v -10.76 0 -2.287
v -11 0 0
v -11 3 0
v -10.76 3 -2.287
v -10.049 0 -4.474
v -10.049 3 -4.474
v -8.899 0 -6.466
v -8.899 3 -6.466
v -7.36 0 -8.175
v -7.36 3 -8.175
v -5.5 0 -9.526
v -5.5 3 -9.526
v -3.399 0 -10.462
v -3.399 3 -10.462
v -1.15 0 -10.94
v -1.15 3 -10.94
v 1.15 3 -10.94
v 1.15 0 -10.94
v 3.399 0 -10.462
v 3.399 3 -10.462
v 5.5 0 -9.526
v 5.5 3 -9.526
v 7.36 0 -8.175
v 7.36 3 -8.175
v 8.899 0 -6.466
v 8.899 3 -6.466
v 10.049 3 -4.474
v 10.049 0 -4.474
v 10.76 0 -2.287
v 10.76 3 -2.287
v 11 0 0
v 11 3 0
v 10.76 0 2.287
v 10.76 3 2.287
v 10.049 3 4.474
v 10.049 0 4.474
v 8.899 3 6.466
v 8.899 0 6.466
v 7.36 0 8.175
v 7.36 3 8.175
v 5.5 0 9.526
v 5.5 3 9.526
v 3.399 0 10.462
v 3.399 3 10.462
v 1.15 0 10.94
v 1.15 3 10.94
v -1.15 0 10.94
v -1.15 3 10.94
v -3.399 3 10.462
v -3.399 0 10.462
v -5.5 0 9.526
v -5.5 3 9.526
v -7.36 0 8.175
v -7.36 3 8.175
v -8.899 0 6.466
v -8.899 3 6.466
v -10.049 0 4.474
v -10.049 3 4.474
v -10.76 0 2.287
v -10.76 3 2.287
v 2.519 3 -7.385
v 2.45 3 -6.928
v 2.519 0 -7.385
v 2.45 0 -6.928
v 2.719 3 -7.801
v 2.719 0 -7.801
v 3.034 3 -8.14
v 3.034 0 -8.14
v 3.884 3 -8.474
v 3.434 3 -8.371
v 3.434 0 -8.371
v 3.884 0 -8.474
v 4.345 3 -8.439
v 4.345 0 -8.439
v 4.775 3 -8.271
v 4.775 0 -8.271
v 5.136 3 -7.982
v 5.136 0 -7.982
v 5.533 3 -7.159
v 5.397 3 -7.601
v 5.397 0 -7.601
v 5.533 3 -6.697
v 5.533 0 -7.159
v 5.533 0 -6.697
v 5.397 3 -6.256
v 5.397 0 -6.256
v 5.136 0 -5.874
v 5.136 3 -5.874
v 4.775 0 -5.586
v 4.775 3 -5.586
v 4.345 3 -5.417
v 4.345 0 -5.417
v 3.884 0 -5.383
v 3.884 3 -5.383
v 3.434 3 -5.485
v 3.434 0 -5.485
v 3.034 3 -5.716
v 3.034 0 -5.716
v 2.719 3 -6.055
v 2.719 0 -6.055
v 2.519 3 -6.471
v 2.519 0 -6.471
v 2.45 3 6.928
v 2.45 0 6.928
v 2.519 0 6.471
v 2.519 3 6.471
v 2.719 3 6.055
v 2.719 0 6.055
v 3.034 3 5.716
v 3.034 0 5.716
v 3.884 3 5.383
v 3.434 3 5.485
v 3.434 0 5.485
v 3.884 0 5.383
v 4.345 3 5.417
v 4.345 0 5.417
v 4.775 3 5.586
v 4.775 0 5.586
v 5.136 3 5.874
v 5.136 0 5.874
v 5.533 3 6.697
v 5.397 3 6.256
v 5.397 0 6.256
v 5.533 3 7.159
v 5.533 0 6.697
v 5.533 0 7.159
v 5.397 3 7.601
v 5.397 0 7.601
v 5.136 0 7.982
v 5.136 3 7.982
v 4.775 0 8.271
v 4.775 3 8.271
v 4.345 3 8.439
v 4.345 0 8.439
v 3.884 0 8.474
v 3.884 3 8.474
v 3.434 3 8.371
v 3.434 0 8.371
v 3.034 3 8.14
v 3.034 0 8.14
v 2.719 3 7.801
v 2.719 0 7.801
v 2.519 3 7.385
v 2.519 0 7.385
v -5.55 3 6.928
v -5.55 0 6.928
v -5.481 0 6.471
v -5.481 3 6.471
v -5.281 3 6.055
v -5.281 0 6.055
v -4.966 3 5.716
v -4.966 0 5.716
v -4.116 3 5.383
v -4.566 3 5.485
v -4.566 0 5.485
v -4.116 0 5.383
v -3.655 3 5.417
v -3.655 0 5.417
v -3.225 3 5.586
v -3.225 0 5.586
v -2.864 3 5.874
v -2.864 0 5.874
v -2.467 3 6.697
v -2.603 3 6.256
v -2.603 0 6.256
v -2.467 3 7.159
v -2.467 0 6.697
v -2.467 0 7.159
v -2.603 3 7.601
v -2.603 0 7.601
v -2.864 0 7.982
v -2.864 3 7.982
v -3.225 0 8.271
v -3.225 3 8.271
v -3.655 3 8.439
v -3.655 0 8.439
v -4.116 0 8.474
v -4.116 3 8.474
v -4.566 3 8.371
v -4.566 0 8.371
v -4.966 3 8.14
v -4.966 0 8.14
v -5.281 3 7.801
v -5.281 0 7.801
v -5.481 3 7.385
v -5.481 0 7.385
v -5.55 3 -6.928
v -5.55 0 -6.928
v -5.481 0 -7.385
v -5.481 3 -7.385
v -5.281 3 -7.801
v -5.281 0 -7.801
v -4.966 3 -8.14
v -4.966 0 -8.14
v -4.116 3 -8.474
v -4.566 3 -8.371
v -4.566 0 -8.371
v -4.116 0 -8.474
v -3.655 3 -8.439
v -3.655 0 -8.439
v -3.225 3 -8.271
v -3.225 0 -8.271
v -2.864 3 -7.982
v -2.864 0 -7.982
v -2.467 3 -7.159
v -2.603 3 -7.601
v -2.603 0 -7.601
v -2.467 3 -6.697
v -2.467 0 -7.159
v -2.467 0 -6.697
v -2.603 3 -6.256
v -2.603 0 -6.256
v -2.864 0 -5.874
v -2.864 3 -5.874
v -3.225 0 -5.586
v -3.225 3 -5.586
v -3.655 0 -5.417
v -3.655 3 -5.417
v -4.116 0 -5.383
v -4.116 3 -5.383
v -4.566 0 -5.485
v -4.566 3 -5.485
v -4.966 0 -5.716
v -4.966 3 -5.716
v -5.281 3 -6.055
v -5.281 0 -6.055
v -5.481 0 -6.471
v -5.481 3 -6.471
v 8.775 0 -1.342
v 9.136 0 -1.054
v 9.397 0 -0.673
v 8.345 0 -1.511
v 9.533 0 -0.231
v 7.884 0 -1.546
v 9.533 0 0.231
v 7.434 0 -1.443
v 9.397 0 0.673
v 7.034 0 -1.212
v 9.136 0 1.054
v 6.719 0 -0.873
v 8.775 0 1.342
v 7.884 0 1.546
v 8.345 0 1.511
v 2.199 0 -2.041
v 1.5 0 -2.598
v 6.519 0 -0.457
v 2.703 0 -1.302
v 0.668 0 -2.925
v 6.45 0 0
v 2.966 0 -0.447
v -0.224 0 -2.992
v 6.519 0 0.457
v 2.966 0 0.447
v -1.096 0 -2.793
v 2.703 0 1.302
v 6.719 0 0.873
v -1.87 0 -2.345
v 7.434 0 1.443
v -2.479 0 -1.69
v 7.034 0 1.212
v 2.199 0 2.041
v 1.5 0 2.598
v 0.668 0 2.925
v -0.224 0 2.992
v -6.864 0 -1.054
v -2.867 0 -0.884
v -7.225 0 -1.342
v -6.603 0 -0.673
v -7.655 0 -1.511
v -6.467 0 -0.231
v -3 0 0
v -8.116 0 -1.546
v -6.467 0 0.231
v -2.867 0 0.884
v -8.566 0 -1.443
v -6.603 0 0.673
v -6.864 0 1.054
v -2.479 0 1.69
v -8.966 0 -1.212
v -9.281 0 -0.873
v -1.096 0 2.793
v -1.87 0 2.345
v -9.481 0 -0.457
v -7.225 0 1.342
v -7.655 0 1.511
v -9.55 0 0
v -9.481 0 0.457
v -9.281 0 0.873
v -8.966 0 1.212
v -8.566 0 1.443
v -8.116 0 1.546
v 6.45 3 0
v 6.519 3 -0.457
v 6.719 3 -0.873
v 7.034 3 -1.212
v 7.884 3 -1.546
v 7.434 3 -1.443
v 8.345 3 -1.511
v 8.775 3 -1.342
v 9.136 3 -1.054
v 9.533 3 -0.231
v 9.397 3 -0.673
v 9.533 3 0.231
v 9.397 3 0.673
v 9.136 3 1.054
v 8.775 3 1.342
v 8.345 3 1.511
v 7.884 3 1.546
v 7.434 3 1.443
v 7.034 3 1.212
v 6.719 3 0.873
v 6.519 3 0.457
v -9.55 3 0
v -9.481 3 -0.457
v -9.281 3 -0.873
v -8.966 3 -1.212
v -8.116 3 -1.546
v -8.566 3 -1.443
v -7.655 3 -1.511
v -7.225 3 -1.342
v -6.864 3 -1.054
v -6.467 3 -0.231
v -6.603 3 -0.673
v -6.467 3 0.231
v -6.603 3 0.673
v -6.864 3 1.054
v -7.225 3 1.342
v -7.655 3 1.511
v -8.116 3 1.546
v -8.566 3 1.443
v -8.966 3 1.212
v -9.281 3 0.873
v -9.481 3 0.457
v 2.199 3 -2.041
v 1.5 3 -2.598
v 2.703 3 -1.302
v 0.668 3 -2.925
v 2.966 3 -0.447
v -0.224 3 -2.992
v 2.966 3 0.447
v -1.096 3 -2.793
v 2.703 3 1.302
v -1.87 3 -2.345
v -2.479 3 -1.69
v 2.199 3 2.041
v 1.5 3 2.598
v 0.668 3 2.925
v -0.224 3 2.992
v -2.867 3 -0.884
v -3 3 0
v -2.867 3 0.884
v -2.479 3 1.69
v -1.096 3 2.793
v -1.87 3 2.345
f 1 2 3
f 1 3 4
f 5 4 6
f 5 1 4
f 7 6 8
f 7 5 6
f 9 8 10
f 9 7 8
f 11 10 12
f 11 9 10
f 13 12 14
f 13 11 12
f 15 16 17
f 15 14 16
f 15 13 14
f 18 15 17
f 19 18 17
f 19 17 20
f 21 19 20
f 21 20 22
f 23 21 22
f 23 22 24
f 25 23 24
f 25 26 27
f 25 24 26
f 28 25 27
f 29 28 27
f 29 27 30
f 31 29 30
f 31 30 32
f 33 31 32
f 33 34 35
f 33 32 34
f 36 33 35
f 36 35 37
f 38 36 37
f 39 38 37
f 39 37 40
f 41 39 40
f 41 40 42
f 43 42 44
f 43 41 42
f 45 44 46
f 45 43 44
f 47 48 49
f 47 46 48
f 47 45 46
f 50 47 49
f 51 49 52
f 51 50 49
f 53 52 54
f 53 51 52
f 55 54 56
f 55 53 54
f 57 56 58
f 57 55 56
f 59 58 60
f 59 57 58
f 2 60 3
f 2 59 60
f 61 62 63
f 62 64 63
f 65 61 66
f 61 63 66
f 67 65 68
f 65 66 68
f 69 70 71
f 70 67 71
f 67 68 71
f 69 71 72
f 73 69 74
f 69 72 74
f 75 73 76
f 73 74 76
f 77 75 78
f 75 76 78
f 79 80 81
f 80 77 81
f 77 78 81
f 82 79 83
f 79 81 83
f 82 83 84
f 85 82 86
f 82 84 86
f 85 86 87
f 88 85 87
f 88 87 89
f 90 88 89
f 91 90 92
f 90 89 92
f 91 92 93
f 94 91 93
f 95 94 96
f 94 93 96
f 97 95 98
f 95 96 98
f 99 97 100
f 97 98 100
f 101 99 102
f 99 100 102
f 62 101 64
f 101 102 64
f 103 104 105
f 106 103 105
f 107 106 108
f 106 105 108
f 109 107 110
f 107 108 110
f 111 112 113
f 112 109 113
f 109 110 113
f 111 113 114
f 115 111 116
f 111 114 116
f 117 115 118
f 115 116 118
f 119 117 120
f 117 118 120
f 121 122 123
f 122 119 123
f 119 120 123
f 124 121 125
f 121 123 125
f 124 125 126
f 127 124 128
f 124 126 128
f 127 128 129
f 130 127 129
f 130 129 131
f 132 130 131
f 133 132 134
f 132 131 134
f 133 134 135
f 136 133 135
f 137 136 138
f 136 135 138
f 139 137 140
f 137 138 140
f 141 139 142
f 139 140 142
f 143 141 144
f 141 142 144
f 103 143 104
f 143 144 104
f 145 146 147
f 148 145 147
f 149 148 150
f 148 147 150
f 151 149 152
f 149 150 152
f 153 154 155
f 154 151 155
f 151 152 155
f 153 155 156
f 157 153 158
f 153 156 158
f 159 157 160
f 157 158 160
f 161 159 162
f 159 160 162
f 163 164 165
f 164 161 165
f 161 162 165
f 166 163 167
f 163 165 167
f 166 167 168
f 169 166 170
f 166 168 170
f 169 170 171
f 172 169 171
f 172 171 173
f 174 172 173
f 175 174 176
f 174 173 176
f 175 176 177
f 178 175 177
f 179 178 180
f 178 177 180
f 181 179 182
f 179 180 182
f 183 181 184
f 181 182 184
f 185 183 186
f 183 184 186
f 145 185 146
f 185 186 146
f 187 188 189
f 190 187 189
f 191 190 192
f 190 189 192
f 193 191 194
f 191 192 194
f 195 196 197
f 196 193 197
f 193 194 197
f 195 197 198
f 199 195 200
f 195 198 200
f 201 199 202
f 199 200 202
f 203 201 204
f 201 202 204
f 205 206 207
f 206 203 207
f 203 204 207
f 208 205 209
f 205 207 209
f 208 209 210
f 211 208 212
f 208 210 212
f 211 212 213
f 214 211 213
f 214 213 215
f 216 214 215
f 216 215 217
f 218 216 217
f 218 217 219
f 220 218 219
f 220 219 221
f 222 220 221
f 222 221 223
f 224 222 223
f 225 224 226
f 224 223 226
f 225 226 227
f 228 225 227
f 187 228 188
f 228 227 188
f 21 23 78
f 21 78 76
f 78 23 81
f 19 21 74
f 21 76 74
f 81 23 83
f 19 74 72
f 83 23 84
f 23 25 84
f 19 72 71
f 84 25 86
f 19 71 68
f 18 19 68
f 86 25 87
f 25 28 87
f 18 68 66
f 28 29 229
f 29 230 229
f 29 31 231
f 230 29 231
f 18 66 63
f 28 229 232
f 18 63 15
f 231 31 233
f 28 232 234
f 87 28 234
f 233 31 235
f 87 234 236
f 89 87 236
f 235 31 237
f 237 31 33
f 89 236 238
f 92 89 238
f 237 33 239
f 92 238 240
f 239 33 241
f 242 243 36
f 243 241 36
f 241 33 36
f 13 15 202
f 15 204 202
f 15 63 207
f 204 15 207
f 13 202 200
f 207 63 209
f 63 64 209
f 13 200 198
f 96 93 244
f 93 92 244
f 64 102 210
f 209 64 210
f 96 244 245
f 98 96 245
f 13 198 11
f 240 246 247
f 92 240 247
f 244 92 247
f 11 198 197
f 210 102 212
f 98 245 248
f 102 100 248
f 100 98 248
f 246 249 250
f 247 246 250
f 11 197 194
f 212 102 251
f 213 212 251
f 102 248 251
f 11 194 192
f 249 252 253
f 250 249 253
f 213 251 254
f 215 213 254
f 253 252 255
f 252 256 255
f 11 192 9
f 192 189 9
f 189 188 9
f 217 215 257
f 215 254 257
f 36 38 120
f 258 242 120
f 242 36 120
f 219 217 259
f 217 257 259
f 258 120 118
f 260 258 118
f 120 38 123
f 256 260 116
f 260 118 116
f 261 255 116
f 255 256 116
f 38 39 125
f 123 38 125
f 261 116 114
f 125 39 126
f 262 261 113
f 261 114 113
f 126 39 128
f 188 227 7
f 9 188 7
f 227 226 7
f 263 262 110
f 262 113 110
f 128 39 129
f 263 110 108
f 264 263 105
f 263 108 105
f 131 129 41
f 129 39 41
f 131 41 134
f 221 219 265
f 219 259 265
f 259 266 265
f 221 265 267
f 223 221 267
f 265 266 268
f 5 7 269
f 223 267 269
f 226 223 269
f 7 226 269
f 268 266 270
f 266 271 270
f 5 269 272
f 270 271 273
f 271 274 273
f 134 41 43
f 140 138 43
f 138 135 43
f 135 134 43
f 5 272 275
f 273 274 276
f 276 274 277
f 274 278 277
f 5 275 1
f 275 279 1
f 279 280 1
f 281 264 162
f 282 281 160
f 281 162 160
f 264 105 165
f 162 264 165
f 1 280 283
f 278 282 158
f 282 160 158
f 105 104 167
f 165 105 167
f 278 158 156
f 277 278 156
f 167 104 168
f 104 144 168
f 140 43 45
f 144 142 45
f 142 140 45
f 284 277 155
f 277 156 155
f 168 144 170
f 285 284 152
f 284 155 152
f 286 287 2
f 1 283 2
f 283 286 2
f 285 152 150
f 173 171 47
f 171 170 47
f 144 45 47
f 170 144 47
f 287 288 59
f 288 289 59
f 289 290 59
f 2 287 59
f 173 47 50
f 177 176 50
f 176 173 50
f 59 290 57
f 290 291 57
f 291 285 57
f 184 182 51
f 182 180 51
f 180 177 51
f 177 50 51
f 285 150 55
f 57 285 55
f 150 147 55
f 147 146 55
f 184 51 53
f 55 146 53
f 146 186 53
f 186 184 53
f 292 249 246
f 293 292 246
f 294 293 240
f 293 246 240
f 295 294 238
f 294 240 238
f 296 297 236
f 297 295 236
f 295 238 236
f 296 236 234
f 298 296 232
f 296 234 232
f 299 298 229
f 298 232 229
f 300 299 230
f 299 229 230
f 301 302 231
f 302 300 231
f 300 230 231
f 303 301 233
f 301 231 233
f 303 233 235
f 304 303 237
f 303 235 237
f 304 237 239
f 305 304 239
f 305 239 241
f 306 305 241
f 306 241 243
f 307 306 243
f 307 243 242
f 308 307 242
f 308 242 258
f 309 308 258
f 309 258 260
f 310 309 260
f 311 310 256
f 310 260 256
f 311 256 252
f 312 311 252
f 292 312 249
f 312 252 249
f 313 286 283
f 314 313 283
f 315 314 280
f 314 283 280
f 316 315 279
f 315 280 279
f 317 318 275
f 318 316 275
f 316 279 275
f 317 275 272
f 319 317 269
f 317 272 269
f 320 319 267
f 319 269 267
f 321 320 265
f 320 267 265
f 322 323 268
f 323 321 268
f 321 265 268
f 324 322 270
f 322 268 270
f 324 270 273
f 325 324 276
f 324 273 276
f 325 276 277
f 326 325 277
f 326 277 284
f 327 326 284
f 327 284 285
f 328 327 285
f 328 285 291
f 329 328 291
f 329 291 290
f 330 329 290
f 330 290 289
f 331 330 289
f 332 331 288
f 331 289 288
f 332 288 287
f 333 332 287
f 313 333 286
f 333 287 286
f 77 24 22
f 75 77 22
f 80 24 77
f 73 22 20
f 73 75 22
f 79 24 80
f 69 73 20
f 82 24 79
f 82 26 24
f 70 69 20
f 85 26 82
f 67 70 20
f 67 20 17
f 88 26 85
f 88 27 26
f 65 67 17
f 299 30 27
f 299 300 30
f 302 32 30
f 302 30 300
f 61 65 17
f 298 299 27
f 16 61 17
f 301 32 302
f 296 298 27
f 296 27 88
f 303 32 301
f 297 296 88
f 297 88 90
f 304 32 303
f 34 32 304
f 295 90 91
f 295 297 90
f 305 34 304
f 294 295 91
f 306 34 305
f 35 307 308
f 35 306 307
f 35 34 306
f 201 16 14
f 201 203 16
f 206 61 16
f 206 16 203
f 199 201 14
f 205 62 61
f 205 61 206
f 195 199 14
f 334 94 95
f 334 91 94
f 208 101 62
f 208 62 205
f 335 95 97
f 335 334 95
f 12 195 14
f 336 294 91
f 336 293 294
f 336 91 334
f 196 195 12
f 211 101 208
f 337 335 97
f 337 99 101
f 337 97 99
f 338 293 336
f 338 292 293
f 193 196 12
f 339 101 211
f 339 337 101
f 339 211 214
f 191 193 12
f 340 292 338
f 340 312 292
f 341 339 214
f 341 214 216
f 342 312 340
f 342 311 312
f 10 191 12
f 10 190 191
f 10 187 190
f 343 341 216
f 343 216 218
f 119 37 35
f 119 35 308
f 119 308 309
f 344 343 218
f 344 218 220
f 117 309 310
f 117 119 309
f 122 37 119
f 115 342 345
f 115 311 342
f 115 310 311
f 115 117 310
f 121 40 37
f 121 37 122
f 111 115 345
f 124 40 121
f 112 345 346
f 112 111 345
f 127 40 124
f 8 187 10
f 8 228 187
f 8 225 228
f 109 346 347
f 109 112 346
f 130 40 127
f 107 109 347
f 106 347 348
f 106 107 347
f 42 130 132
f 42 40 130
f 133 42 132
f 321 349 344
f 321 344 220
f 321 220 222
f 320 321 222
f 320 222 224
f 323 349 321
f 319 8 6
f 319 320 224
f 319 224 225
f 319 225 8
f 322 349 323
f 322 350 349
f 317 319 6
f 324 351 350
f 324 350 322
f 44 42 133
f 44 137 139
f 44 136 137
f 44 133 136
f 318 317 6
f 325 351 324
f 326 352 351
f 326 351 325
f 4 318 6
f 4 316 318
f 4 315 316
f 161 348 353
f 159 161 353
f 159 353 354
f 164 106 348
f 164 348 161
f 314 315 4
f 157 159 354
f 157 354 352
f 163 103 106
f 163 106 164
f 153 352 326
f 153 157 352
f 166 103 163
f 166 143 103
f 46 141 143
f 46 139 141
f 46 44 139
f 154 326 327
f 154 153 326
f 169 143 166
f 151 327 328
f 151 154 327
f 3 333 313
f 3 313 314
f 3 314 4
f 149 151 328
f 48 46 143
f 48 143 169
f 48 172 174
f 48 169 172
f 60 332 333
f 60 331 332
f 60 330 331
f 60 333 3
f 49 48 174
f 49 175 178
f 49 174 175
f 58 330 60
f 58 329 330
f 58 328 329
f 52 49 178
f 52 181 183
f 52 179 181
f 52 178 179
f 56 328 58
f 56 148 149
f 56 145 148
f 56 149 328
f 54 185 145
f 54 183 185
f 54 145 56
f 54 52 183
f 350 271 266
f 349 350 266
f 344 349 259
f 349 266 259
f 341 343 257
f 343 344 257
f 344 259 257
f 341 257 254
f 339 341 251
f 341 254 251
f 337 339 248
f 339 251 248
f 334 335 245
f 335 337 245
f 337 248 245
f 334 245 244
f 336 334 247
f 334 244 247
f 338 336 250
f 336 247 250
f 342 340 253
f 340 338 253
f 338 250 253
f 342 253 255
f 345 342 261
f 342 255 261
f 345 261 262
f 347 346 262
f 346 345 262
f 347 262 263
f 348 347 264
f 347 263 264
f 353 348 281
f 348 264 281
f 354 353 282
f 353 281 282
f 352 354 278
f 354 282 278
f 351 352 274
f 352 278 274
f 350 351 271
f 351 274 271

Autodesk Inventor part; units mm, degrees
ref_plane "YZ Plane" through (0, 0, 0) normal (1, 0, 0) x (0, 1, 0)
ref_plane "XZ Plane" through (0, 0, 0) normal (0, 1, 0) x (-1, 0, 0)
ref_plane "XY Plane" through (0, 0, 0) normal (0, 0, 1) x (1, 0, 0)
sketch "Sketch1" plane through (0, 0, 0) normal (0, 1, 0) x (-1, 0, 0)
  circle A0 centre (0, 0) radius 11
  circle A1 centre (0, 0) radius 8 construction
  circle A2 centre (8, 0) radius 1.55
  line L0 (0, 0) -> (8, 0) construction
  circle A3 centre (4, 6.9282) radius 1.55
  circle A4 centre (-4, 6.9282) radius 1.55
  circle A5 centre (-8, 0) radius 1.55
  circle A6 centre (-4, -6.9282) radius 1.55
  circle A7 centre (4, -6.9282) radius 1.55
  circle A8 centre (0, 0) radius 3
  dimension "d1" = 16
  dimension "d0" = 22
  dimension "d2" = 3.1
  dimension "d5" = 360
  dimension "d9" = 6
extrude "Extrusion1" add sketch "Sketch1" along normal blind 3
properties part number "FlywheelSpacer" material "PC/ABS Plastic"
